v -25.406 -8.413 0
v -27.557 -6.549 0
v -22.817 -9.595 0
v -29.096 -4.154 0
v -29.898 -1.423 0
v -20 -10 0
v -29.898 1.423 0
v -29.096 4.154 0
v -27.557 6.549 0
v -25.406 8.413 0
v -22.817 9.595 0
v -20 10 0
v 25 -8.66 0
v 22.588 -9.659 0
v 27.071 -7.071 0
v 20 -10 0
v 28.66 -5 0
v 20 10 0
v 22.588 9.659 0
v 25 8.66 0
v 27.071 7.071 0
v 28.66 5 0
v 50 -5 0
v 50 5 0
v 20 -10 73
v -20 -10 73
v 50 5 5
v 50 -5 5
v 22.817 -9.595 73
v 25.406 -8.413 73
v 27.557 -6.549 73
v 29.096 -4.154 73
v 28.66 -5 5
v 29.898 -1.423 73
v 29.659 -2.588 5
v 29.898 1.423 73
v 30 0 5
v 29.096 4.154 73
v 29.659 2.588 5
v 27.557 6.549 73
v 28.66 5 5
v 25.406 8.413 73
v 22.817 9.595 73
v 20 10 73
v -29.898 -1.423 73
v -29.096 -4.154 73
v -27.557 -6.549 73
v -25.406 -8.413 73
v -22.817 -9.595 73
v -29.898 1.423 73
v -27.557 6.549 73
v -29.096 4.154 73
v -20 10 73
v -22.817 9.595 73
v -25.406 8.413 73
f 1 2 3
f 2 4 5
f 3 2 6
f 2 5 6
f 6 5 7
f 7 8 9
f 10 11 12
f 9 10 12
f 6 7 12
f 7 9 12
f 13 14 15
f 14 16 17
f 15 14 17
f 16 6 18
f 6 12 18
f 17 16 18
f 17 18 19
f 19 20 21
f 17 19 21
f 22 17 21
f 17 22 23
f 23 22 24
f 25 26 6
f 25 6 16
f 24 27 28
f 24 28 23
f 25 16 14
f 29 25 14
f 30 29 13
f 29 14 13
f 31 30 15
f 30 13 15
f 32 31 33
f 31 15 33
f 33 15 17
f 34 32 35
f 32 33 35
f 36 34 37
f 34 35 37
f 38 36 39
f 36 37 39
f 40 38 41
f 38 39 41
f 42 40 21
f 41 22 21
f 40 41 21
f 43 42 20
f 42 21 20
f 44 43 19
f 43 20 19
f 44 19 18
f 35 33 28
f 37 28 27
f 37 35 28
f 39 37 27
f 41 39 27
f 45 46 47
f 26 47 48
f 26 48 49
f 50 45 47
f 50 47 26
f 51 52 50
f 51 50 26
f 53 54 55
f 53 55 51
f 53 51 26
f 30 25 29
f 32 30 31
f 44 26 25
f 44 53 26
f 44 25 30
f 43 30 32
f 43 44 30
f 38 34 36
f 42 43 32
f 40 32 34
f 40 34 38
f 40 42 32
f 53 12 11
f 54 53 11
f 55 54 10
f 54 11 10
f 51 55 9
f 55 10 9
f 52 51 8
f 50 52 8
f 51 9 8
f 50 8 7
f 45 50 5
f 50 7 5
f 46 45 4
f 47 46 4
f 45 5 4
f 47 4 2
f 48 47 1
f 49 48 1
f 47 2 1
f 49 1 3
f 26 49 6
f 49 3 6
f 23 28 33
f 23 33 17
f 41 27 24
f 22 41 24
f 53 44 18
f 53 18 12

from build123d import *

# Parameters (mm, degrees)
BOSS_EXTRUDE1_DEPTH = 73
SKETCH2_W           = 5
SKETCH2_H           = 10
BOSS_EXTRUDE2_DEPTH = 50


with BuildPart() as part:
    # Sketch1 → Boss-Extrude1 (new body)
    with BuildSketch(Plane.XY):
        with BuildLine():
            Line((-20, -10), (20, -10))
            ThreePointArc((20, -10), (30, 0), (20, 10))
            Line((20, 10), (-20, 10))
            ThreePointArc((-20, 10), (-30, 0), (-20, -10))
        make_face()
    extrude(amount=BOSS_EXTRUDE1_DEPTH)

    # Sketch2 → Boss-Extrude2 (add)
    with BuildSketch(Plane(origin=(0, 0, 0), x_dir=(0, 0, -1), z_dir=(1, 0, 0))):
        with Locations((-2.5, 0)):
            Rectangle(SKETCH2_W, SKETCH2_H)
    extrude(amount=BOSS_EXTRUDE2_DEPTH)


solid = part.part
